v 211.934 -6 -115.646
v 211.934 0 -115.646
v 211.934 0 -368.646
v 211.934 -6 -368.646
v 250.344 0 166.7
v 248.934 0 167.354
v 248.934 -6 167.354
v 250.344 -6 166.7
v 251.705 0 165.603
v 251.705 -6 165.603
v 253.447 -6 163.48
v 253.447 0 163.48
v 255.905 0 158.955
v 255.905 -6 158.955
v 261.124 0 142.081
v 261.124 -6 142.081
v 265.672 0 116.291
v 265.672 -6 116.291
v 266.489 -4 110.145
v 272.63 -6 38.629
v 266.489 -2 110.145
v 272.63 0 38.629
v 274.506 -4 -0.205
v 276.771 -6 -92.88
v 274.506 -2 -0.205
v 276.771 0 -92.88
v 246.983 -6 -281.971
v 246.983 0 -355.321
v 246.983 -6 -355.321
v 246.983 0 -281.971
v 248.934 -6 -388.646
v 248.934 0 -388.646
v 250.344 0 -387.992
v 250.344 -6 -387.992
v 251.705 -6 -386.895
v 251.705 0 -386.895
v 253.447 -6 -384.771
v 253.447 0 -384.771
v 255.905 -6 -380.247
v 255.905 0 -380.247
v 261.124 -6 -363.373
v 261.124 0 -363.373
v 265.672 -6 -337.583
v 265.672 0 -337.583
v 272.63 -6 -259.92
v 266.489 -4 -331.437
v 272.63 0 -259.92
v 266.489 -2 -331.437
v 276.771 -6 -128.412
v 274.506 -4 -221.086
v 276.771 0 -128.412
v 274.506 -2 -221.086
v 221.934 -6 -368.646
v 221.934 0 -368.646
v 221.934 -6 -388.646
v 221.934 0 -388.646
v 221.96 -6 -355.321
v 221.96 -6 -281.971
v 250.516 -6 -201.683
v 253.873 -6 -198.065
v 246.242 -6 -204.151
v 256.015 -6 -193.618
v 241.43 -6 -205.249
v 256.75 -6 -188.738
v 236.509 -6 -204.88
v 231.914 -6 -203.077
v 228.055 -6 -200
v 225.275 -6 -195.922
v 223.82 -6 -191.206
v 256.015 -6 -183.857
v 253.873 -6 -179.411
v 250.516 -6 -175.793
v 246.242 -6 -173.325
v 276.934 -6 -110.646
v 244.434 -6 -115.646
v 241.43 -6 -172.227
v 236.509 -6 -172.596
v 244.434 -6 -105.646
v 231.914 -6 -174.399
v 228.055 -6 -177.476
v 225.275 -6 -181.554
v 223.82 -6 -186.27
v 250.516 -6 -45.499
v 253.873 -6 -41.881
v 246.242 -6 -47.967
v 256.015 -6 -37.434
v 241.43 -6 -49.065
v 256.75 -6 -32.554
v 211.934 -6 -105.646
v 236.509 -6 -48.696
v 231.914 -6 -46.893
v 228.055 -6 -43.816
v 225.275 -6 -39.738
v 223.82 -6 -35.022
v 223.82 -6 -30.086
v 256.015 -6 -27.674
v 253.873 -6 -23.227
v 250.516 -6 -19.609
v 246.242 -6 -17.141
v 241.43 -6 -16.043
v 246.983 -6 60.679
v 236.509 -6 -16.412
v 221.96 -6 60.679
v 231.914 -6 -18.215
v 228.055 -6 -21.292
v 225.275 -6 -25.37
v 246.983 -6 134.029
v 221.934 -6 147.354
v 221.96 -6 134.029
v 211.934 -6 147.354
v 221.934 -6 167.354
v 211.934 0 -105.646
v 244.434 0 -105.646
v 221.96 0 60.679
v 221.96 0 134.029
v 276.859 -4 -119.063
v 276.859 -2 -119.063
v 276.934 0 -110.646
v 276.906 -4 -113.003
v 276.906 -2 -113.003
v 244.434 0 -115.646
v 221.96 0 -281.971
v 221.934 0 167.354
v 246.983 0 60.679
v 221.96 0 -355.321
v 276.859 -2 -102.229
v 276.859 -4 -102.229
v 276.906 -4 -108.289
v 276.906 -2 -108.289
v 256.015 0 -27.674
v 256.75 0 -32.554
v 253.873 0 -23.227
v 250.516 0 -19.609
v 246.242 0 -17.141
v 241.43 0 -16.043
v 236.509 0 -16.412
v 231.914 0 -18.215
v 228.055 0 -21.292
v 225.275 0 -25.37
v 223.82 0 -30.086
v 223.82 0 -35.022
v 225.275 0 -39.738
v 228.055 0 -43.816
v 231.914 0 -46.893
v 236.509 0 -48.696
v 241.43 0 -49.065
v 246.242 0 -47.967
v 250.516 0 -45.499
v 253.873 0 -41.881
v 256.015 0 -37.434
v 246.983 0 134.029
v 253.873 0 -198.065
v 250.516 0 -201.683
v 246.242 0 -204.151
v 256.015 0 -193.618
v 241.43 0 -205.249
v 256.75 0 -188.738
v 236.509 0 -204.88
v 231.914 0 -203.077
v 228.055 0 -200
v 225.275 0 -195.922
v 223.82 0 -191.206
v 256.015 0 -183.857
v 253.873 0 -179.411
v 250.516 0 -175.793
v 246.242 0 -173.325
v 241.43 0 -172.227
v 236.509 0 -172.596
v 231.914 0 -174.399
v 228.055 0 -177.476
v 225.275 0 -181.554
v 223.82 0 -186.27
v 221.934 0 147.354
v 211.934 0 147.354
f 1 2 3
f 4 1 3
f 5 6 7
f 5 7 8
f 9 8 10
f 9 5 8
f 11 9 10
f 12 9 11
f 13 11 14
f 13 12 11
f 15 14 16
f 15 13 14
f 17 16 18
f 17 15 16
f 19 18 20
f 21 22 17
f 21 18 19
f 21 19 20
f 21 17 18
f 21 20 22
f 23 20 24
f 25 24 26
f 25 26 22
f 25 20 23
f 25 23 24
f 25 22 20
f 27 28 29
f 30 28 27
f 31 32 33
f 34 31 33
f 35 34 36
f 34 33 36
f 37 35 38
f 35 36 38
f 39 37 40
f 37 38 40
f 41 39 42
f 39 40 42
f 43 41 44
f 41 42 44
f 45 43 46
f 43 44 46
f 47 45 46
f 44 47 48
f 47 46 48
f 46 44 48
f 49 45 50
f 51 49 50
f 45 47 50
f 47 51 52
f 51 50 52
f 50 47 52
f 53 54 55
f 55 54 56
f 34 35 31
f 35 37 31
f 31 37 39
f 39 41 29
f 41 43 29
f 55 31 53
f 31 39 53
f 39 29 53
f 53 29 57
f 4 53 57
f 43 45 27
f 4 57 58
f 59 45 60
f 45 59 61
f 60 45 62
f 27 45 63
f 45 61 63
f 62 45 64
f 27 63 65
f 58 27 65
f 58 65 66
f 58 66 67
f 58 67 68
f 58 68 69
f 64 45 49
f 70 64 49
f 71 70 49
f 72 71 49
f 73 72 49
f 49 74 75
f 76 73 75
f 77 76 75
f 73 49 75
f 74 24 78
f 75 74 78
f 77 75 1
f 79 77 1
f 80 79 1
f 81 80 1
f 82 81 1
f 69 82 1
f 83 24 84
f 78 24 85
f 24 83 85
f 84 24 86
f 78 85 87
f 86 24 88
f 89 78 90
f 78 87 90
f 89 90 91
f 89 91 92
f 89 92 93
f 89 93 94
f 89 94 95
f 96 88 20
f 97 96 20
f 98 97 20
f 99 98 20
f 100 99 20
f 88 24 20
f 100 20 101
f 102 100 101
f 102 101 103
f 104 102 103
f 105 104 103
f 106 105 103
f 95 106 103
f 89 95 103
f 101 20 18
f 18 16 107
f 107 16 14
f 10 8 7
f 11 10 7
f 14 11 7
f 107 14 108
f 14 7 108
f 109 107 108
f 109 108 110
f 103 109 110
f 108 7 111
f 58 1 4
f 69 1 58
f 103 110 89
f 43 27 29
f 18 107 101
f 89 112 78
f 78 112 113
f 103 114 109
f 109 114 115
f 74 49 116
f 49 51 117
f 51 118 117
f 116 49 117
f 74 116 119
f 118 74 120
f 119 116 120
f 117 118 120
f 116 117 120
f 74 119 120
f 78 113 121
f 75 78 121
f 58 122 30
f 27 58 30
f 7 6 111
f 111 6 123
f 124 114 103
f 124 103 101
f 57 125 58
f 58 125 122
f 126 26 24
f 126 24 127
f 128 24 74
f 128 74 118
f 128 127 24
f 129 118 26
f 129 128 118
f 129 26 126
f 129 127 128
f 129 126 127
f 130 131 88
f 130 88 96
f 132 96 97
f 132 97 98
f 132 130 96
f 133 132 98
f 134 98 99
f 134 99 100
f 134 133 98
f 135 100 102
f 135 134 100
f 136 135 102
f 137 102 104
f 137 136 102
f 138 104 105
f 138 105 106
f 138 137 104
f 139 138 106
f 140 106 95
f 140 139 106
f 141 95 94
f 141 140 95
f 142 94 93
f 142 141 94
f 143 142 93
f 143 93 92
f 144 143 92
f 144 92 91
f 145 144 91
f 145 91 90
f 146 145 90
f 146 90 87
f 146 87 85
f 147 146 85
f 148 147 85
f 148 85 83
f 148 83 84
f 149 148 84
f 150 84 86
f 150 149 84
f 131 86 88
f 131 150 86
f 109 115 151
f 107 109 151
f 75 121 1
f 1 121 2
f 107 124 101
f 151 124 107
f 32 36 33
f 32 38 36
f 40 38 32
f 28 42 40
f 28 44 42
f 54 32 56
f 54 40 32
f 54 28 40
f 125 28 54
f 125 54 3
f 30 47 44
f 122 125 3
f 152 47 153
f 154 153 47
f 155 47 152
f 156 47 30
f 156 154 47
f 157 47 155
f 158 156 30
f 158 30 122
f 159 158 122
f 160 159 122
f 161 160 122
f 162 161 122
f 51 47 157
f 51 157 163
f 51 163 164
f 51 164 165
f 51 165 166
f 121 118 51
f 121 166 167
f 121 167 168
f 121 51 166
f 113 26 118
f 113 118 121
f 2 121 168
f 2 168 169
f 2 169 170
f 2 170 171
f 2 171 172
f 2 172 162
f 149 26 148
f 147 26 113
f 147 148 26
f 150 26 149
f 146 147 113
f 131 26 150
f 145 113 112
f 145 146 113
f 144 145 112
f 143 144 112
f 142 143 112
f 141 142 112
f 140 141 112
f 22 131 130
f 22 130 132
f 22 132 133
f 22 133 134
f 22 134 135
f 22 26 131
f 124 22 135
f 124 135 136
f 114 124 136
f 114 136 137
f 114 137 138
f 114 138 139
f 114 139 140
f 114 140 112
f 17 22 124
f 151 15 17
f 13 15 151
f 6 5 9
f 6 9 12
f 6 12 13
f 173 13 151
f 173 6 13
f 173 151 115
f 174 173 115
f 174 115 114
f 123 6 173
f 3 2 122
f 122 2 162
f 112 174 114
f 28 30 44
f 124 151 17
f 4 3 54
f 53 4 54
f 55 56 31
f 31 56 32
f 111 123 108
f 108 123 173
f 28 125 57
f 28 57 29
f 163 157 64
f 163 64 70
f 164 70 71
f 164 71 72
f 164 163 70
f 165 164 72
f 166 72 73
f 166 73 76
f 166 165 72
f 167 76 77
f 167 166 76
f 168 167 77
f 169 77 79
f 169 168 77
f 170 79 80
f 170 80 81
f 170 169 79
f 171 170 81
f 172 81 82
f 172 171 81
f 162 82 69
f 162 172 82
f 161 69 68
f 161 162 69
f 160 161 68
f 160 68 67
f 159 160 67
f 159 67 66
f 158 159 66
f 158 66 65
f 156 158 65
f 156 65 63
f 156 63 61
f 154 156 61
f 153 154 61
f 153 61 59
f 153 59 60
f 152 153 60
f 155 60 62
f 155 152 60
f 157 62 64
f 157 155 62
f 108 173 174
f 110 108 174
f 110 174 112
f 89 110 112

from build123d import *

# Parameters (mm, degrees)
F0_R     = 16.5575031532
F0_W     = 25.0224173069
F0_H     = 73.3505785465
F1_DEPTH = 6


# Not quite as in the source:
# - a feature names something its author has since deleted; it is built from what else it names


with BuildPart() as f1:
    # F0 (on Front) → F1 (new body)
    with BuildSketch(Plane.XZ):
        with BuildLine():
            add(Edge.make_bspline(
                [(248.9335625079, 167.3540463153), (272.5197521804, 160.3214966928), (276.1214780845, -32.6489303119), (276.7706038072, -92.8803390196)],
                knots=[0, 0, 0, 0, 236.7397799676, 236.7397799676, 236.7397799676, 236.7397799676], degree=3))
            Line((248.9335625079, 167.3540463153), (221.9335625079, 167.3540463153))
            Line((221.9335625079, 167.3540463153), (221.9335625079, 147.3540463153))
            Line((221.9335625079, 147.3540463153), (211.9335625079, 147.3540463153))
            Line((211.9335625079, 147.3540463153), (211.9335625079, -105.6459536847))
            Line((211.9335625079, -105.6459536847), (244.4335625079, -105.6459536847))
            Line((244.4335625079, -105.6459536847), (244.4335625079, -110.6459536847))
            Line((244.4335625079, -110.6459536847), (276.9335625079, -110.6459536847))
            add(Edge.make_bspline(
                [(276.7706038072, -92.8803390196), (276.8875933326, -103.7356227789), (276.9086779216, -110.279341705), (276.9335625079, -110.6459536847)],
                knots=[236.7397799676, 236.7397799676, 236.7397799676, 236.7397799676, 279.4065138826, 279.4065138826, 279.4065138826, 279.4065138826], degree=3))
        make_face()
        with Locations((240.1929050684, -32.5540304184)):
            Circle(F0_R, mode=Mode.SUBTRACT)
        with Locations((234.4716570738, 97.3541972034)):
            Rectangle(F0_W, F0_H, mode=Mode.SUBTRACT)
        with BuildLine():
            add(Edge.make_bspline(
                [(276.7706038072, -128.4115683497), (276.8875933326, -117.5562845905), (276.9086779216, -111.0125656644), (276.9335625079, -110.6459536847)],
                knots=[236.7397799677, 236.7397799677, 236.7397799677, 236.7397799677, 279.4065138826, 279.4065138826, 279.4065138826, 279.4065138826], degree=3))
            Line((276.9335625079, -110.6459536847), (244.4335625079, -110.6459536847))
            Line((244.4335625079, -110.6459536847), (244.4335625079, -115.6459536847))
            Line((244.4335625079, -115.6459536847), (211.9335625079, -115.6459536847))
            Line((211.9335625079, -115.6459536847), (211.9335625079, -368.6459536847))
            Line((211.9335625079, -368.6459536847), (221.9335625079, -368.6459536847))
            Line((221.9335625079, -368.6459536847), (221.9335625079, -388.6459536847))
            Line((221.9335625079, -388.6459536847), (248.9335625079, -388.6459536847))
            add(Edge.make_bspline(
                [(248.9335625079, -388.6459536847), (272.5197521804, -381.6134040622), (276.1214780845, -188.6429770574), (276.7706038072, -128.4115683497)],
                knots=[0, 0, 0, 0, 236.7397799677, 236.7397799677, 236.7397799677, 236.7397799677], degree=3))
        make_face()
        with Locations((234.4716570738, -318.6461045727)):
            Rectangle(F0_W, F0_H, mode=Mode.SUBTRACT)
        with Locations((240.1929050684, -188.737876951)):
            Circle(F0_R, mode=Mode.SUBTRACT)
    extrude(amount=F1_DEPTH)


solid = f1.part
